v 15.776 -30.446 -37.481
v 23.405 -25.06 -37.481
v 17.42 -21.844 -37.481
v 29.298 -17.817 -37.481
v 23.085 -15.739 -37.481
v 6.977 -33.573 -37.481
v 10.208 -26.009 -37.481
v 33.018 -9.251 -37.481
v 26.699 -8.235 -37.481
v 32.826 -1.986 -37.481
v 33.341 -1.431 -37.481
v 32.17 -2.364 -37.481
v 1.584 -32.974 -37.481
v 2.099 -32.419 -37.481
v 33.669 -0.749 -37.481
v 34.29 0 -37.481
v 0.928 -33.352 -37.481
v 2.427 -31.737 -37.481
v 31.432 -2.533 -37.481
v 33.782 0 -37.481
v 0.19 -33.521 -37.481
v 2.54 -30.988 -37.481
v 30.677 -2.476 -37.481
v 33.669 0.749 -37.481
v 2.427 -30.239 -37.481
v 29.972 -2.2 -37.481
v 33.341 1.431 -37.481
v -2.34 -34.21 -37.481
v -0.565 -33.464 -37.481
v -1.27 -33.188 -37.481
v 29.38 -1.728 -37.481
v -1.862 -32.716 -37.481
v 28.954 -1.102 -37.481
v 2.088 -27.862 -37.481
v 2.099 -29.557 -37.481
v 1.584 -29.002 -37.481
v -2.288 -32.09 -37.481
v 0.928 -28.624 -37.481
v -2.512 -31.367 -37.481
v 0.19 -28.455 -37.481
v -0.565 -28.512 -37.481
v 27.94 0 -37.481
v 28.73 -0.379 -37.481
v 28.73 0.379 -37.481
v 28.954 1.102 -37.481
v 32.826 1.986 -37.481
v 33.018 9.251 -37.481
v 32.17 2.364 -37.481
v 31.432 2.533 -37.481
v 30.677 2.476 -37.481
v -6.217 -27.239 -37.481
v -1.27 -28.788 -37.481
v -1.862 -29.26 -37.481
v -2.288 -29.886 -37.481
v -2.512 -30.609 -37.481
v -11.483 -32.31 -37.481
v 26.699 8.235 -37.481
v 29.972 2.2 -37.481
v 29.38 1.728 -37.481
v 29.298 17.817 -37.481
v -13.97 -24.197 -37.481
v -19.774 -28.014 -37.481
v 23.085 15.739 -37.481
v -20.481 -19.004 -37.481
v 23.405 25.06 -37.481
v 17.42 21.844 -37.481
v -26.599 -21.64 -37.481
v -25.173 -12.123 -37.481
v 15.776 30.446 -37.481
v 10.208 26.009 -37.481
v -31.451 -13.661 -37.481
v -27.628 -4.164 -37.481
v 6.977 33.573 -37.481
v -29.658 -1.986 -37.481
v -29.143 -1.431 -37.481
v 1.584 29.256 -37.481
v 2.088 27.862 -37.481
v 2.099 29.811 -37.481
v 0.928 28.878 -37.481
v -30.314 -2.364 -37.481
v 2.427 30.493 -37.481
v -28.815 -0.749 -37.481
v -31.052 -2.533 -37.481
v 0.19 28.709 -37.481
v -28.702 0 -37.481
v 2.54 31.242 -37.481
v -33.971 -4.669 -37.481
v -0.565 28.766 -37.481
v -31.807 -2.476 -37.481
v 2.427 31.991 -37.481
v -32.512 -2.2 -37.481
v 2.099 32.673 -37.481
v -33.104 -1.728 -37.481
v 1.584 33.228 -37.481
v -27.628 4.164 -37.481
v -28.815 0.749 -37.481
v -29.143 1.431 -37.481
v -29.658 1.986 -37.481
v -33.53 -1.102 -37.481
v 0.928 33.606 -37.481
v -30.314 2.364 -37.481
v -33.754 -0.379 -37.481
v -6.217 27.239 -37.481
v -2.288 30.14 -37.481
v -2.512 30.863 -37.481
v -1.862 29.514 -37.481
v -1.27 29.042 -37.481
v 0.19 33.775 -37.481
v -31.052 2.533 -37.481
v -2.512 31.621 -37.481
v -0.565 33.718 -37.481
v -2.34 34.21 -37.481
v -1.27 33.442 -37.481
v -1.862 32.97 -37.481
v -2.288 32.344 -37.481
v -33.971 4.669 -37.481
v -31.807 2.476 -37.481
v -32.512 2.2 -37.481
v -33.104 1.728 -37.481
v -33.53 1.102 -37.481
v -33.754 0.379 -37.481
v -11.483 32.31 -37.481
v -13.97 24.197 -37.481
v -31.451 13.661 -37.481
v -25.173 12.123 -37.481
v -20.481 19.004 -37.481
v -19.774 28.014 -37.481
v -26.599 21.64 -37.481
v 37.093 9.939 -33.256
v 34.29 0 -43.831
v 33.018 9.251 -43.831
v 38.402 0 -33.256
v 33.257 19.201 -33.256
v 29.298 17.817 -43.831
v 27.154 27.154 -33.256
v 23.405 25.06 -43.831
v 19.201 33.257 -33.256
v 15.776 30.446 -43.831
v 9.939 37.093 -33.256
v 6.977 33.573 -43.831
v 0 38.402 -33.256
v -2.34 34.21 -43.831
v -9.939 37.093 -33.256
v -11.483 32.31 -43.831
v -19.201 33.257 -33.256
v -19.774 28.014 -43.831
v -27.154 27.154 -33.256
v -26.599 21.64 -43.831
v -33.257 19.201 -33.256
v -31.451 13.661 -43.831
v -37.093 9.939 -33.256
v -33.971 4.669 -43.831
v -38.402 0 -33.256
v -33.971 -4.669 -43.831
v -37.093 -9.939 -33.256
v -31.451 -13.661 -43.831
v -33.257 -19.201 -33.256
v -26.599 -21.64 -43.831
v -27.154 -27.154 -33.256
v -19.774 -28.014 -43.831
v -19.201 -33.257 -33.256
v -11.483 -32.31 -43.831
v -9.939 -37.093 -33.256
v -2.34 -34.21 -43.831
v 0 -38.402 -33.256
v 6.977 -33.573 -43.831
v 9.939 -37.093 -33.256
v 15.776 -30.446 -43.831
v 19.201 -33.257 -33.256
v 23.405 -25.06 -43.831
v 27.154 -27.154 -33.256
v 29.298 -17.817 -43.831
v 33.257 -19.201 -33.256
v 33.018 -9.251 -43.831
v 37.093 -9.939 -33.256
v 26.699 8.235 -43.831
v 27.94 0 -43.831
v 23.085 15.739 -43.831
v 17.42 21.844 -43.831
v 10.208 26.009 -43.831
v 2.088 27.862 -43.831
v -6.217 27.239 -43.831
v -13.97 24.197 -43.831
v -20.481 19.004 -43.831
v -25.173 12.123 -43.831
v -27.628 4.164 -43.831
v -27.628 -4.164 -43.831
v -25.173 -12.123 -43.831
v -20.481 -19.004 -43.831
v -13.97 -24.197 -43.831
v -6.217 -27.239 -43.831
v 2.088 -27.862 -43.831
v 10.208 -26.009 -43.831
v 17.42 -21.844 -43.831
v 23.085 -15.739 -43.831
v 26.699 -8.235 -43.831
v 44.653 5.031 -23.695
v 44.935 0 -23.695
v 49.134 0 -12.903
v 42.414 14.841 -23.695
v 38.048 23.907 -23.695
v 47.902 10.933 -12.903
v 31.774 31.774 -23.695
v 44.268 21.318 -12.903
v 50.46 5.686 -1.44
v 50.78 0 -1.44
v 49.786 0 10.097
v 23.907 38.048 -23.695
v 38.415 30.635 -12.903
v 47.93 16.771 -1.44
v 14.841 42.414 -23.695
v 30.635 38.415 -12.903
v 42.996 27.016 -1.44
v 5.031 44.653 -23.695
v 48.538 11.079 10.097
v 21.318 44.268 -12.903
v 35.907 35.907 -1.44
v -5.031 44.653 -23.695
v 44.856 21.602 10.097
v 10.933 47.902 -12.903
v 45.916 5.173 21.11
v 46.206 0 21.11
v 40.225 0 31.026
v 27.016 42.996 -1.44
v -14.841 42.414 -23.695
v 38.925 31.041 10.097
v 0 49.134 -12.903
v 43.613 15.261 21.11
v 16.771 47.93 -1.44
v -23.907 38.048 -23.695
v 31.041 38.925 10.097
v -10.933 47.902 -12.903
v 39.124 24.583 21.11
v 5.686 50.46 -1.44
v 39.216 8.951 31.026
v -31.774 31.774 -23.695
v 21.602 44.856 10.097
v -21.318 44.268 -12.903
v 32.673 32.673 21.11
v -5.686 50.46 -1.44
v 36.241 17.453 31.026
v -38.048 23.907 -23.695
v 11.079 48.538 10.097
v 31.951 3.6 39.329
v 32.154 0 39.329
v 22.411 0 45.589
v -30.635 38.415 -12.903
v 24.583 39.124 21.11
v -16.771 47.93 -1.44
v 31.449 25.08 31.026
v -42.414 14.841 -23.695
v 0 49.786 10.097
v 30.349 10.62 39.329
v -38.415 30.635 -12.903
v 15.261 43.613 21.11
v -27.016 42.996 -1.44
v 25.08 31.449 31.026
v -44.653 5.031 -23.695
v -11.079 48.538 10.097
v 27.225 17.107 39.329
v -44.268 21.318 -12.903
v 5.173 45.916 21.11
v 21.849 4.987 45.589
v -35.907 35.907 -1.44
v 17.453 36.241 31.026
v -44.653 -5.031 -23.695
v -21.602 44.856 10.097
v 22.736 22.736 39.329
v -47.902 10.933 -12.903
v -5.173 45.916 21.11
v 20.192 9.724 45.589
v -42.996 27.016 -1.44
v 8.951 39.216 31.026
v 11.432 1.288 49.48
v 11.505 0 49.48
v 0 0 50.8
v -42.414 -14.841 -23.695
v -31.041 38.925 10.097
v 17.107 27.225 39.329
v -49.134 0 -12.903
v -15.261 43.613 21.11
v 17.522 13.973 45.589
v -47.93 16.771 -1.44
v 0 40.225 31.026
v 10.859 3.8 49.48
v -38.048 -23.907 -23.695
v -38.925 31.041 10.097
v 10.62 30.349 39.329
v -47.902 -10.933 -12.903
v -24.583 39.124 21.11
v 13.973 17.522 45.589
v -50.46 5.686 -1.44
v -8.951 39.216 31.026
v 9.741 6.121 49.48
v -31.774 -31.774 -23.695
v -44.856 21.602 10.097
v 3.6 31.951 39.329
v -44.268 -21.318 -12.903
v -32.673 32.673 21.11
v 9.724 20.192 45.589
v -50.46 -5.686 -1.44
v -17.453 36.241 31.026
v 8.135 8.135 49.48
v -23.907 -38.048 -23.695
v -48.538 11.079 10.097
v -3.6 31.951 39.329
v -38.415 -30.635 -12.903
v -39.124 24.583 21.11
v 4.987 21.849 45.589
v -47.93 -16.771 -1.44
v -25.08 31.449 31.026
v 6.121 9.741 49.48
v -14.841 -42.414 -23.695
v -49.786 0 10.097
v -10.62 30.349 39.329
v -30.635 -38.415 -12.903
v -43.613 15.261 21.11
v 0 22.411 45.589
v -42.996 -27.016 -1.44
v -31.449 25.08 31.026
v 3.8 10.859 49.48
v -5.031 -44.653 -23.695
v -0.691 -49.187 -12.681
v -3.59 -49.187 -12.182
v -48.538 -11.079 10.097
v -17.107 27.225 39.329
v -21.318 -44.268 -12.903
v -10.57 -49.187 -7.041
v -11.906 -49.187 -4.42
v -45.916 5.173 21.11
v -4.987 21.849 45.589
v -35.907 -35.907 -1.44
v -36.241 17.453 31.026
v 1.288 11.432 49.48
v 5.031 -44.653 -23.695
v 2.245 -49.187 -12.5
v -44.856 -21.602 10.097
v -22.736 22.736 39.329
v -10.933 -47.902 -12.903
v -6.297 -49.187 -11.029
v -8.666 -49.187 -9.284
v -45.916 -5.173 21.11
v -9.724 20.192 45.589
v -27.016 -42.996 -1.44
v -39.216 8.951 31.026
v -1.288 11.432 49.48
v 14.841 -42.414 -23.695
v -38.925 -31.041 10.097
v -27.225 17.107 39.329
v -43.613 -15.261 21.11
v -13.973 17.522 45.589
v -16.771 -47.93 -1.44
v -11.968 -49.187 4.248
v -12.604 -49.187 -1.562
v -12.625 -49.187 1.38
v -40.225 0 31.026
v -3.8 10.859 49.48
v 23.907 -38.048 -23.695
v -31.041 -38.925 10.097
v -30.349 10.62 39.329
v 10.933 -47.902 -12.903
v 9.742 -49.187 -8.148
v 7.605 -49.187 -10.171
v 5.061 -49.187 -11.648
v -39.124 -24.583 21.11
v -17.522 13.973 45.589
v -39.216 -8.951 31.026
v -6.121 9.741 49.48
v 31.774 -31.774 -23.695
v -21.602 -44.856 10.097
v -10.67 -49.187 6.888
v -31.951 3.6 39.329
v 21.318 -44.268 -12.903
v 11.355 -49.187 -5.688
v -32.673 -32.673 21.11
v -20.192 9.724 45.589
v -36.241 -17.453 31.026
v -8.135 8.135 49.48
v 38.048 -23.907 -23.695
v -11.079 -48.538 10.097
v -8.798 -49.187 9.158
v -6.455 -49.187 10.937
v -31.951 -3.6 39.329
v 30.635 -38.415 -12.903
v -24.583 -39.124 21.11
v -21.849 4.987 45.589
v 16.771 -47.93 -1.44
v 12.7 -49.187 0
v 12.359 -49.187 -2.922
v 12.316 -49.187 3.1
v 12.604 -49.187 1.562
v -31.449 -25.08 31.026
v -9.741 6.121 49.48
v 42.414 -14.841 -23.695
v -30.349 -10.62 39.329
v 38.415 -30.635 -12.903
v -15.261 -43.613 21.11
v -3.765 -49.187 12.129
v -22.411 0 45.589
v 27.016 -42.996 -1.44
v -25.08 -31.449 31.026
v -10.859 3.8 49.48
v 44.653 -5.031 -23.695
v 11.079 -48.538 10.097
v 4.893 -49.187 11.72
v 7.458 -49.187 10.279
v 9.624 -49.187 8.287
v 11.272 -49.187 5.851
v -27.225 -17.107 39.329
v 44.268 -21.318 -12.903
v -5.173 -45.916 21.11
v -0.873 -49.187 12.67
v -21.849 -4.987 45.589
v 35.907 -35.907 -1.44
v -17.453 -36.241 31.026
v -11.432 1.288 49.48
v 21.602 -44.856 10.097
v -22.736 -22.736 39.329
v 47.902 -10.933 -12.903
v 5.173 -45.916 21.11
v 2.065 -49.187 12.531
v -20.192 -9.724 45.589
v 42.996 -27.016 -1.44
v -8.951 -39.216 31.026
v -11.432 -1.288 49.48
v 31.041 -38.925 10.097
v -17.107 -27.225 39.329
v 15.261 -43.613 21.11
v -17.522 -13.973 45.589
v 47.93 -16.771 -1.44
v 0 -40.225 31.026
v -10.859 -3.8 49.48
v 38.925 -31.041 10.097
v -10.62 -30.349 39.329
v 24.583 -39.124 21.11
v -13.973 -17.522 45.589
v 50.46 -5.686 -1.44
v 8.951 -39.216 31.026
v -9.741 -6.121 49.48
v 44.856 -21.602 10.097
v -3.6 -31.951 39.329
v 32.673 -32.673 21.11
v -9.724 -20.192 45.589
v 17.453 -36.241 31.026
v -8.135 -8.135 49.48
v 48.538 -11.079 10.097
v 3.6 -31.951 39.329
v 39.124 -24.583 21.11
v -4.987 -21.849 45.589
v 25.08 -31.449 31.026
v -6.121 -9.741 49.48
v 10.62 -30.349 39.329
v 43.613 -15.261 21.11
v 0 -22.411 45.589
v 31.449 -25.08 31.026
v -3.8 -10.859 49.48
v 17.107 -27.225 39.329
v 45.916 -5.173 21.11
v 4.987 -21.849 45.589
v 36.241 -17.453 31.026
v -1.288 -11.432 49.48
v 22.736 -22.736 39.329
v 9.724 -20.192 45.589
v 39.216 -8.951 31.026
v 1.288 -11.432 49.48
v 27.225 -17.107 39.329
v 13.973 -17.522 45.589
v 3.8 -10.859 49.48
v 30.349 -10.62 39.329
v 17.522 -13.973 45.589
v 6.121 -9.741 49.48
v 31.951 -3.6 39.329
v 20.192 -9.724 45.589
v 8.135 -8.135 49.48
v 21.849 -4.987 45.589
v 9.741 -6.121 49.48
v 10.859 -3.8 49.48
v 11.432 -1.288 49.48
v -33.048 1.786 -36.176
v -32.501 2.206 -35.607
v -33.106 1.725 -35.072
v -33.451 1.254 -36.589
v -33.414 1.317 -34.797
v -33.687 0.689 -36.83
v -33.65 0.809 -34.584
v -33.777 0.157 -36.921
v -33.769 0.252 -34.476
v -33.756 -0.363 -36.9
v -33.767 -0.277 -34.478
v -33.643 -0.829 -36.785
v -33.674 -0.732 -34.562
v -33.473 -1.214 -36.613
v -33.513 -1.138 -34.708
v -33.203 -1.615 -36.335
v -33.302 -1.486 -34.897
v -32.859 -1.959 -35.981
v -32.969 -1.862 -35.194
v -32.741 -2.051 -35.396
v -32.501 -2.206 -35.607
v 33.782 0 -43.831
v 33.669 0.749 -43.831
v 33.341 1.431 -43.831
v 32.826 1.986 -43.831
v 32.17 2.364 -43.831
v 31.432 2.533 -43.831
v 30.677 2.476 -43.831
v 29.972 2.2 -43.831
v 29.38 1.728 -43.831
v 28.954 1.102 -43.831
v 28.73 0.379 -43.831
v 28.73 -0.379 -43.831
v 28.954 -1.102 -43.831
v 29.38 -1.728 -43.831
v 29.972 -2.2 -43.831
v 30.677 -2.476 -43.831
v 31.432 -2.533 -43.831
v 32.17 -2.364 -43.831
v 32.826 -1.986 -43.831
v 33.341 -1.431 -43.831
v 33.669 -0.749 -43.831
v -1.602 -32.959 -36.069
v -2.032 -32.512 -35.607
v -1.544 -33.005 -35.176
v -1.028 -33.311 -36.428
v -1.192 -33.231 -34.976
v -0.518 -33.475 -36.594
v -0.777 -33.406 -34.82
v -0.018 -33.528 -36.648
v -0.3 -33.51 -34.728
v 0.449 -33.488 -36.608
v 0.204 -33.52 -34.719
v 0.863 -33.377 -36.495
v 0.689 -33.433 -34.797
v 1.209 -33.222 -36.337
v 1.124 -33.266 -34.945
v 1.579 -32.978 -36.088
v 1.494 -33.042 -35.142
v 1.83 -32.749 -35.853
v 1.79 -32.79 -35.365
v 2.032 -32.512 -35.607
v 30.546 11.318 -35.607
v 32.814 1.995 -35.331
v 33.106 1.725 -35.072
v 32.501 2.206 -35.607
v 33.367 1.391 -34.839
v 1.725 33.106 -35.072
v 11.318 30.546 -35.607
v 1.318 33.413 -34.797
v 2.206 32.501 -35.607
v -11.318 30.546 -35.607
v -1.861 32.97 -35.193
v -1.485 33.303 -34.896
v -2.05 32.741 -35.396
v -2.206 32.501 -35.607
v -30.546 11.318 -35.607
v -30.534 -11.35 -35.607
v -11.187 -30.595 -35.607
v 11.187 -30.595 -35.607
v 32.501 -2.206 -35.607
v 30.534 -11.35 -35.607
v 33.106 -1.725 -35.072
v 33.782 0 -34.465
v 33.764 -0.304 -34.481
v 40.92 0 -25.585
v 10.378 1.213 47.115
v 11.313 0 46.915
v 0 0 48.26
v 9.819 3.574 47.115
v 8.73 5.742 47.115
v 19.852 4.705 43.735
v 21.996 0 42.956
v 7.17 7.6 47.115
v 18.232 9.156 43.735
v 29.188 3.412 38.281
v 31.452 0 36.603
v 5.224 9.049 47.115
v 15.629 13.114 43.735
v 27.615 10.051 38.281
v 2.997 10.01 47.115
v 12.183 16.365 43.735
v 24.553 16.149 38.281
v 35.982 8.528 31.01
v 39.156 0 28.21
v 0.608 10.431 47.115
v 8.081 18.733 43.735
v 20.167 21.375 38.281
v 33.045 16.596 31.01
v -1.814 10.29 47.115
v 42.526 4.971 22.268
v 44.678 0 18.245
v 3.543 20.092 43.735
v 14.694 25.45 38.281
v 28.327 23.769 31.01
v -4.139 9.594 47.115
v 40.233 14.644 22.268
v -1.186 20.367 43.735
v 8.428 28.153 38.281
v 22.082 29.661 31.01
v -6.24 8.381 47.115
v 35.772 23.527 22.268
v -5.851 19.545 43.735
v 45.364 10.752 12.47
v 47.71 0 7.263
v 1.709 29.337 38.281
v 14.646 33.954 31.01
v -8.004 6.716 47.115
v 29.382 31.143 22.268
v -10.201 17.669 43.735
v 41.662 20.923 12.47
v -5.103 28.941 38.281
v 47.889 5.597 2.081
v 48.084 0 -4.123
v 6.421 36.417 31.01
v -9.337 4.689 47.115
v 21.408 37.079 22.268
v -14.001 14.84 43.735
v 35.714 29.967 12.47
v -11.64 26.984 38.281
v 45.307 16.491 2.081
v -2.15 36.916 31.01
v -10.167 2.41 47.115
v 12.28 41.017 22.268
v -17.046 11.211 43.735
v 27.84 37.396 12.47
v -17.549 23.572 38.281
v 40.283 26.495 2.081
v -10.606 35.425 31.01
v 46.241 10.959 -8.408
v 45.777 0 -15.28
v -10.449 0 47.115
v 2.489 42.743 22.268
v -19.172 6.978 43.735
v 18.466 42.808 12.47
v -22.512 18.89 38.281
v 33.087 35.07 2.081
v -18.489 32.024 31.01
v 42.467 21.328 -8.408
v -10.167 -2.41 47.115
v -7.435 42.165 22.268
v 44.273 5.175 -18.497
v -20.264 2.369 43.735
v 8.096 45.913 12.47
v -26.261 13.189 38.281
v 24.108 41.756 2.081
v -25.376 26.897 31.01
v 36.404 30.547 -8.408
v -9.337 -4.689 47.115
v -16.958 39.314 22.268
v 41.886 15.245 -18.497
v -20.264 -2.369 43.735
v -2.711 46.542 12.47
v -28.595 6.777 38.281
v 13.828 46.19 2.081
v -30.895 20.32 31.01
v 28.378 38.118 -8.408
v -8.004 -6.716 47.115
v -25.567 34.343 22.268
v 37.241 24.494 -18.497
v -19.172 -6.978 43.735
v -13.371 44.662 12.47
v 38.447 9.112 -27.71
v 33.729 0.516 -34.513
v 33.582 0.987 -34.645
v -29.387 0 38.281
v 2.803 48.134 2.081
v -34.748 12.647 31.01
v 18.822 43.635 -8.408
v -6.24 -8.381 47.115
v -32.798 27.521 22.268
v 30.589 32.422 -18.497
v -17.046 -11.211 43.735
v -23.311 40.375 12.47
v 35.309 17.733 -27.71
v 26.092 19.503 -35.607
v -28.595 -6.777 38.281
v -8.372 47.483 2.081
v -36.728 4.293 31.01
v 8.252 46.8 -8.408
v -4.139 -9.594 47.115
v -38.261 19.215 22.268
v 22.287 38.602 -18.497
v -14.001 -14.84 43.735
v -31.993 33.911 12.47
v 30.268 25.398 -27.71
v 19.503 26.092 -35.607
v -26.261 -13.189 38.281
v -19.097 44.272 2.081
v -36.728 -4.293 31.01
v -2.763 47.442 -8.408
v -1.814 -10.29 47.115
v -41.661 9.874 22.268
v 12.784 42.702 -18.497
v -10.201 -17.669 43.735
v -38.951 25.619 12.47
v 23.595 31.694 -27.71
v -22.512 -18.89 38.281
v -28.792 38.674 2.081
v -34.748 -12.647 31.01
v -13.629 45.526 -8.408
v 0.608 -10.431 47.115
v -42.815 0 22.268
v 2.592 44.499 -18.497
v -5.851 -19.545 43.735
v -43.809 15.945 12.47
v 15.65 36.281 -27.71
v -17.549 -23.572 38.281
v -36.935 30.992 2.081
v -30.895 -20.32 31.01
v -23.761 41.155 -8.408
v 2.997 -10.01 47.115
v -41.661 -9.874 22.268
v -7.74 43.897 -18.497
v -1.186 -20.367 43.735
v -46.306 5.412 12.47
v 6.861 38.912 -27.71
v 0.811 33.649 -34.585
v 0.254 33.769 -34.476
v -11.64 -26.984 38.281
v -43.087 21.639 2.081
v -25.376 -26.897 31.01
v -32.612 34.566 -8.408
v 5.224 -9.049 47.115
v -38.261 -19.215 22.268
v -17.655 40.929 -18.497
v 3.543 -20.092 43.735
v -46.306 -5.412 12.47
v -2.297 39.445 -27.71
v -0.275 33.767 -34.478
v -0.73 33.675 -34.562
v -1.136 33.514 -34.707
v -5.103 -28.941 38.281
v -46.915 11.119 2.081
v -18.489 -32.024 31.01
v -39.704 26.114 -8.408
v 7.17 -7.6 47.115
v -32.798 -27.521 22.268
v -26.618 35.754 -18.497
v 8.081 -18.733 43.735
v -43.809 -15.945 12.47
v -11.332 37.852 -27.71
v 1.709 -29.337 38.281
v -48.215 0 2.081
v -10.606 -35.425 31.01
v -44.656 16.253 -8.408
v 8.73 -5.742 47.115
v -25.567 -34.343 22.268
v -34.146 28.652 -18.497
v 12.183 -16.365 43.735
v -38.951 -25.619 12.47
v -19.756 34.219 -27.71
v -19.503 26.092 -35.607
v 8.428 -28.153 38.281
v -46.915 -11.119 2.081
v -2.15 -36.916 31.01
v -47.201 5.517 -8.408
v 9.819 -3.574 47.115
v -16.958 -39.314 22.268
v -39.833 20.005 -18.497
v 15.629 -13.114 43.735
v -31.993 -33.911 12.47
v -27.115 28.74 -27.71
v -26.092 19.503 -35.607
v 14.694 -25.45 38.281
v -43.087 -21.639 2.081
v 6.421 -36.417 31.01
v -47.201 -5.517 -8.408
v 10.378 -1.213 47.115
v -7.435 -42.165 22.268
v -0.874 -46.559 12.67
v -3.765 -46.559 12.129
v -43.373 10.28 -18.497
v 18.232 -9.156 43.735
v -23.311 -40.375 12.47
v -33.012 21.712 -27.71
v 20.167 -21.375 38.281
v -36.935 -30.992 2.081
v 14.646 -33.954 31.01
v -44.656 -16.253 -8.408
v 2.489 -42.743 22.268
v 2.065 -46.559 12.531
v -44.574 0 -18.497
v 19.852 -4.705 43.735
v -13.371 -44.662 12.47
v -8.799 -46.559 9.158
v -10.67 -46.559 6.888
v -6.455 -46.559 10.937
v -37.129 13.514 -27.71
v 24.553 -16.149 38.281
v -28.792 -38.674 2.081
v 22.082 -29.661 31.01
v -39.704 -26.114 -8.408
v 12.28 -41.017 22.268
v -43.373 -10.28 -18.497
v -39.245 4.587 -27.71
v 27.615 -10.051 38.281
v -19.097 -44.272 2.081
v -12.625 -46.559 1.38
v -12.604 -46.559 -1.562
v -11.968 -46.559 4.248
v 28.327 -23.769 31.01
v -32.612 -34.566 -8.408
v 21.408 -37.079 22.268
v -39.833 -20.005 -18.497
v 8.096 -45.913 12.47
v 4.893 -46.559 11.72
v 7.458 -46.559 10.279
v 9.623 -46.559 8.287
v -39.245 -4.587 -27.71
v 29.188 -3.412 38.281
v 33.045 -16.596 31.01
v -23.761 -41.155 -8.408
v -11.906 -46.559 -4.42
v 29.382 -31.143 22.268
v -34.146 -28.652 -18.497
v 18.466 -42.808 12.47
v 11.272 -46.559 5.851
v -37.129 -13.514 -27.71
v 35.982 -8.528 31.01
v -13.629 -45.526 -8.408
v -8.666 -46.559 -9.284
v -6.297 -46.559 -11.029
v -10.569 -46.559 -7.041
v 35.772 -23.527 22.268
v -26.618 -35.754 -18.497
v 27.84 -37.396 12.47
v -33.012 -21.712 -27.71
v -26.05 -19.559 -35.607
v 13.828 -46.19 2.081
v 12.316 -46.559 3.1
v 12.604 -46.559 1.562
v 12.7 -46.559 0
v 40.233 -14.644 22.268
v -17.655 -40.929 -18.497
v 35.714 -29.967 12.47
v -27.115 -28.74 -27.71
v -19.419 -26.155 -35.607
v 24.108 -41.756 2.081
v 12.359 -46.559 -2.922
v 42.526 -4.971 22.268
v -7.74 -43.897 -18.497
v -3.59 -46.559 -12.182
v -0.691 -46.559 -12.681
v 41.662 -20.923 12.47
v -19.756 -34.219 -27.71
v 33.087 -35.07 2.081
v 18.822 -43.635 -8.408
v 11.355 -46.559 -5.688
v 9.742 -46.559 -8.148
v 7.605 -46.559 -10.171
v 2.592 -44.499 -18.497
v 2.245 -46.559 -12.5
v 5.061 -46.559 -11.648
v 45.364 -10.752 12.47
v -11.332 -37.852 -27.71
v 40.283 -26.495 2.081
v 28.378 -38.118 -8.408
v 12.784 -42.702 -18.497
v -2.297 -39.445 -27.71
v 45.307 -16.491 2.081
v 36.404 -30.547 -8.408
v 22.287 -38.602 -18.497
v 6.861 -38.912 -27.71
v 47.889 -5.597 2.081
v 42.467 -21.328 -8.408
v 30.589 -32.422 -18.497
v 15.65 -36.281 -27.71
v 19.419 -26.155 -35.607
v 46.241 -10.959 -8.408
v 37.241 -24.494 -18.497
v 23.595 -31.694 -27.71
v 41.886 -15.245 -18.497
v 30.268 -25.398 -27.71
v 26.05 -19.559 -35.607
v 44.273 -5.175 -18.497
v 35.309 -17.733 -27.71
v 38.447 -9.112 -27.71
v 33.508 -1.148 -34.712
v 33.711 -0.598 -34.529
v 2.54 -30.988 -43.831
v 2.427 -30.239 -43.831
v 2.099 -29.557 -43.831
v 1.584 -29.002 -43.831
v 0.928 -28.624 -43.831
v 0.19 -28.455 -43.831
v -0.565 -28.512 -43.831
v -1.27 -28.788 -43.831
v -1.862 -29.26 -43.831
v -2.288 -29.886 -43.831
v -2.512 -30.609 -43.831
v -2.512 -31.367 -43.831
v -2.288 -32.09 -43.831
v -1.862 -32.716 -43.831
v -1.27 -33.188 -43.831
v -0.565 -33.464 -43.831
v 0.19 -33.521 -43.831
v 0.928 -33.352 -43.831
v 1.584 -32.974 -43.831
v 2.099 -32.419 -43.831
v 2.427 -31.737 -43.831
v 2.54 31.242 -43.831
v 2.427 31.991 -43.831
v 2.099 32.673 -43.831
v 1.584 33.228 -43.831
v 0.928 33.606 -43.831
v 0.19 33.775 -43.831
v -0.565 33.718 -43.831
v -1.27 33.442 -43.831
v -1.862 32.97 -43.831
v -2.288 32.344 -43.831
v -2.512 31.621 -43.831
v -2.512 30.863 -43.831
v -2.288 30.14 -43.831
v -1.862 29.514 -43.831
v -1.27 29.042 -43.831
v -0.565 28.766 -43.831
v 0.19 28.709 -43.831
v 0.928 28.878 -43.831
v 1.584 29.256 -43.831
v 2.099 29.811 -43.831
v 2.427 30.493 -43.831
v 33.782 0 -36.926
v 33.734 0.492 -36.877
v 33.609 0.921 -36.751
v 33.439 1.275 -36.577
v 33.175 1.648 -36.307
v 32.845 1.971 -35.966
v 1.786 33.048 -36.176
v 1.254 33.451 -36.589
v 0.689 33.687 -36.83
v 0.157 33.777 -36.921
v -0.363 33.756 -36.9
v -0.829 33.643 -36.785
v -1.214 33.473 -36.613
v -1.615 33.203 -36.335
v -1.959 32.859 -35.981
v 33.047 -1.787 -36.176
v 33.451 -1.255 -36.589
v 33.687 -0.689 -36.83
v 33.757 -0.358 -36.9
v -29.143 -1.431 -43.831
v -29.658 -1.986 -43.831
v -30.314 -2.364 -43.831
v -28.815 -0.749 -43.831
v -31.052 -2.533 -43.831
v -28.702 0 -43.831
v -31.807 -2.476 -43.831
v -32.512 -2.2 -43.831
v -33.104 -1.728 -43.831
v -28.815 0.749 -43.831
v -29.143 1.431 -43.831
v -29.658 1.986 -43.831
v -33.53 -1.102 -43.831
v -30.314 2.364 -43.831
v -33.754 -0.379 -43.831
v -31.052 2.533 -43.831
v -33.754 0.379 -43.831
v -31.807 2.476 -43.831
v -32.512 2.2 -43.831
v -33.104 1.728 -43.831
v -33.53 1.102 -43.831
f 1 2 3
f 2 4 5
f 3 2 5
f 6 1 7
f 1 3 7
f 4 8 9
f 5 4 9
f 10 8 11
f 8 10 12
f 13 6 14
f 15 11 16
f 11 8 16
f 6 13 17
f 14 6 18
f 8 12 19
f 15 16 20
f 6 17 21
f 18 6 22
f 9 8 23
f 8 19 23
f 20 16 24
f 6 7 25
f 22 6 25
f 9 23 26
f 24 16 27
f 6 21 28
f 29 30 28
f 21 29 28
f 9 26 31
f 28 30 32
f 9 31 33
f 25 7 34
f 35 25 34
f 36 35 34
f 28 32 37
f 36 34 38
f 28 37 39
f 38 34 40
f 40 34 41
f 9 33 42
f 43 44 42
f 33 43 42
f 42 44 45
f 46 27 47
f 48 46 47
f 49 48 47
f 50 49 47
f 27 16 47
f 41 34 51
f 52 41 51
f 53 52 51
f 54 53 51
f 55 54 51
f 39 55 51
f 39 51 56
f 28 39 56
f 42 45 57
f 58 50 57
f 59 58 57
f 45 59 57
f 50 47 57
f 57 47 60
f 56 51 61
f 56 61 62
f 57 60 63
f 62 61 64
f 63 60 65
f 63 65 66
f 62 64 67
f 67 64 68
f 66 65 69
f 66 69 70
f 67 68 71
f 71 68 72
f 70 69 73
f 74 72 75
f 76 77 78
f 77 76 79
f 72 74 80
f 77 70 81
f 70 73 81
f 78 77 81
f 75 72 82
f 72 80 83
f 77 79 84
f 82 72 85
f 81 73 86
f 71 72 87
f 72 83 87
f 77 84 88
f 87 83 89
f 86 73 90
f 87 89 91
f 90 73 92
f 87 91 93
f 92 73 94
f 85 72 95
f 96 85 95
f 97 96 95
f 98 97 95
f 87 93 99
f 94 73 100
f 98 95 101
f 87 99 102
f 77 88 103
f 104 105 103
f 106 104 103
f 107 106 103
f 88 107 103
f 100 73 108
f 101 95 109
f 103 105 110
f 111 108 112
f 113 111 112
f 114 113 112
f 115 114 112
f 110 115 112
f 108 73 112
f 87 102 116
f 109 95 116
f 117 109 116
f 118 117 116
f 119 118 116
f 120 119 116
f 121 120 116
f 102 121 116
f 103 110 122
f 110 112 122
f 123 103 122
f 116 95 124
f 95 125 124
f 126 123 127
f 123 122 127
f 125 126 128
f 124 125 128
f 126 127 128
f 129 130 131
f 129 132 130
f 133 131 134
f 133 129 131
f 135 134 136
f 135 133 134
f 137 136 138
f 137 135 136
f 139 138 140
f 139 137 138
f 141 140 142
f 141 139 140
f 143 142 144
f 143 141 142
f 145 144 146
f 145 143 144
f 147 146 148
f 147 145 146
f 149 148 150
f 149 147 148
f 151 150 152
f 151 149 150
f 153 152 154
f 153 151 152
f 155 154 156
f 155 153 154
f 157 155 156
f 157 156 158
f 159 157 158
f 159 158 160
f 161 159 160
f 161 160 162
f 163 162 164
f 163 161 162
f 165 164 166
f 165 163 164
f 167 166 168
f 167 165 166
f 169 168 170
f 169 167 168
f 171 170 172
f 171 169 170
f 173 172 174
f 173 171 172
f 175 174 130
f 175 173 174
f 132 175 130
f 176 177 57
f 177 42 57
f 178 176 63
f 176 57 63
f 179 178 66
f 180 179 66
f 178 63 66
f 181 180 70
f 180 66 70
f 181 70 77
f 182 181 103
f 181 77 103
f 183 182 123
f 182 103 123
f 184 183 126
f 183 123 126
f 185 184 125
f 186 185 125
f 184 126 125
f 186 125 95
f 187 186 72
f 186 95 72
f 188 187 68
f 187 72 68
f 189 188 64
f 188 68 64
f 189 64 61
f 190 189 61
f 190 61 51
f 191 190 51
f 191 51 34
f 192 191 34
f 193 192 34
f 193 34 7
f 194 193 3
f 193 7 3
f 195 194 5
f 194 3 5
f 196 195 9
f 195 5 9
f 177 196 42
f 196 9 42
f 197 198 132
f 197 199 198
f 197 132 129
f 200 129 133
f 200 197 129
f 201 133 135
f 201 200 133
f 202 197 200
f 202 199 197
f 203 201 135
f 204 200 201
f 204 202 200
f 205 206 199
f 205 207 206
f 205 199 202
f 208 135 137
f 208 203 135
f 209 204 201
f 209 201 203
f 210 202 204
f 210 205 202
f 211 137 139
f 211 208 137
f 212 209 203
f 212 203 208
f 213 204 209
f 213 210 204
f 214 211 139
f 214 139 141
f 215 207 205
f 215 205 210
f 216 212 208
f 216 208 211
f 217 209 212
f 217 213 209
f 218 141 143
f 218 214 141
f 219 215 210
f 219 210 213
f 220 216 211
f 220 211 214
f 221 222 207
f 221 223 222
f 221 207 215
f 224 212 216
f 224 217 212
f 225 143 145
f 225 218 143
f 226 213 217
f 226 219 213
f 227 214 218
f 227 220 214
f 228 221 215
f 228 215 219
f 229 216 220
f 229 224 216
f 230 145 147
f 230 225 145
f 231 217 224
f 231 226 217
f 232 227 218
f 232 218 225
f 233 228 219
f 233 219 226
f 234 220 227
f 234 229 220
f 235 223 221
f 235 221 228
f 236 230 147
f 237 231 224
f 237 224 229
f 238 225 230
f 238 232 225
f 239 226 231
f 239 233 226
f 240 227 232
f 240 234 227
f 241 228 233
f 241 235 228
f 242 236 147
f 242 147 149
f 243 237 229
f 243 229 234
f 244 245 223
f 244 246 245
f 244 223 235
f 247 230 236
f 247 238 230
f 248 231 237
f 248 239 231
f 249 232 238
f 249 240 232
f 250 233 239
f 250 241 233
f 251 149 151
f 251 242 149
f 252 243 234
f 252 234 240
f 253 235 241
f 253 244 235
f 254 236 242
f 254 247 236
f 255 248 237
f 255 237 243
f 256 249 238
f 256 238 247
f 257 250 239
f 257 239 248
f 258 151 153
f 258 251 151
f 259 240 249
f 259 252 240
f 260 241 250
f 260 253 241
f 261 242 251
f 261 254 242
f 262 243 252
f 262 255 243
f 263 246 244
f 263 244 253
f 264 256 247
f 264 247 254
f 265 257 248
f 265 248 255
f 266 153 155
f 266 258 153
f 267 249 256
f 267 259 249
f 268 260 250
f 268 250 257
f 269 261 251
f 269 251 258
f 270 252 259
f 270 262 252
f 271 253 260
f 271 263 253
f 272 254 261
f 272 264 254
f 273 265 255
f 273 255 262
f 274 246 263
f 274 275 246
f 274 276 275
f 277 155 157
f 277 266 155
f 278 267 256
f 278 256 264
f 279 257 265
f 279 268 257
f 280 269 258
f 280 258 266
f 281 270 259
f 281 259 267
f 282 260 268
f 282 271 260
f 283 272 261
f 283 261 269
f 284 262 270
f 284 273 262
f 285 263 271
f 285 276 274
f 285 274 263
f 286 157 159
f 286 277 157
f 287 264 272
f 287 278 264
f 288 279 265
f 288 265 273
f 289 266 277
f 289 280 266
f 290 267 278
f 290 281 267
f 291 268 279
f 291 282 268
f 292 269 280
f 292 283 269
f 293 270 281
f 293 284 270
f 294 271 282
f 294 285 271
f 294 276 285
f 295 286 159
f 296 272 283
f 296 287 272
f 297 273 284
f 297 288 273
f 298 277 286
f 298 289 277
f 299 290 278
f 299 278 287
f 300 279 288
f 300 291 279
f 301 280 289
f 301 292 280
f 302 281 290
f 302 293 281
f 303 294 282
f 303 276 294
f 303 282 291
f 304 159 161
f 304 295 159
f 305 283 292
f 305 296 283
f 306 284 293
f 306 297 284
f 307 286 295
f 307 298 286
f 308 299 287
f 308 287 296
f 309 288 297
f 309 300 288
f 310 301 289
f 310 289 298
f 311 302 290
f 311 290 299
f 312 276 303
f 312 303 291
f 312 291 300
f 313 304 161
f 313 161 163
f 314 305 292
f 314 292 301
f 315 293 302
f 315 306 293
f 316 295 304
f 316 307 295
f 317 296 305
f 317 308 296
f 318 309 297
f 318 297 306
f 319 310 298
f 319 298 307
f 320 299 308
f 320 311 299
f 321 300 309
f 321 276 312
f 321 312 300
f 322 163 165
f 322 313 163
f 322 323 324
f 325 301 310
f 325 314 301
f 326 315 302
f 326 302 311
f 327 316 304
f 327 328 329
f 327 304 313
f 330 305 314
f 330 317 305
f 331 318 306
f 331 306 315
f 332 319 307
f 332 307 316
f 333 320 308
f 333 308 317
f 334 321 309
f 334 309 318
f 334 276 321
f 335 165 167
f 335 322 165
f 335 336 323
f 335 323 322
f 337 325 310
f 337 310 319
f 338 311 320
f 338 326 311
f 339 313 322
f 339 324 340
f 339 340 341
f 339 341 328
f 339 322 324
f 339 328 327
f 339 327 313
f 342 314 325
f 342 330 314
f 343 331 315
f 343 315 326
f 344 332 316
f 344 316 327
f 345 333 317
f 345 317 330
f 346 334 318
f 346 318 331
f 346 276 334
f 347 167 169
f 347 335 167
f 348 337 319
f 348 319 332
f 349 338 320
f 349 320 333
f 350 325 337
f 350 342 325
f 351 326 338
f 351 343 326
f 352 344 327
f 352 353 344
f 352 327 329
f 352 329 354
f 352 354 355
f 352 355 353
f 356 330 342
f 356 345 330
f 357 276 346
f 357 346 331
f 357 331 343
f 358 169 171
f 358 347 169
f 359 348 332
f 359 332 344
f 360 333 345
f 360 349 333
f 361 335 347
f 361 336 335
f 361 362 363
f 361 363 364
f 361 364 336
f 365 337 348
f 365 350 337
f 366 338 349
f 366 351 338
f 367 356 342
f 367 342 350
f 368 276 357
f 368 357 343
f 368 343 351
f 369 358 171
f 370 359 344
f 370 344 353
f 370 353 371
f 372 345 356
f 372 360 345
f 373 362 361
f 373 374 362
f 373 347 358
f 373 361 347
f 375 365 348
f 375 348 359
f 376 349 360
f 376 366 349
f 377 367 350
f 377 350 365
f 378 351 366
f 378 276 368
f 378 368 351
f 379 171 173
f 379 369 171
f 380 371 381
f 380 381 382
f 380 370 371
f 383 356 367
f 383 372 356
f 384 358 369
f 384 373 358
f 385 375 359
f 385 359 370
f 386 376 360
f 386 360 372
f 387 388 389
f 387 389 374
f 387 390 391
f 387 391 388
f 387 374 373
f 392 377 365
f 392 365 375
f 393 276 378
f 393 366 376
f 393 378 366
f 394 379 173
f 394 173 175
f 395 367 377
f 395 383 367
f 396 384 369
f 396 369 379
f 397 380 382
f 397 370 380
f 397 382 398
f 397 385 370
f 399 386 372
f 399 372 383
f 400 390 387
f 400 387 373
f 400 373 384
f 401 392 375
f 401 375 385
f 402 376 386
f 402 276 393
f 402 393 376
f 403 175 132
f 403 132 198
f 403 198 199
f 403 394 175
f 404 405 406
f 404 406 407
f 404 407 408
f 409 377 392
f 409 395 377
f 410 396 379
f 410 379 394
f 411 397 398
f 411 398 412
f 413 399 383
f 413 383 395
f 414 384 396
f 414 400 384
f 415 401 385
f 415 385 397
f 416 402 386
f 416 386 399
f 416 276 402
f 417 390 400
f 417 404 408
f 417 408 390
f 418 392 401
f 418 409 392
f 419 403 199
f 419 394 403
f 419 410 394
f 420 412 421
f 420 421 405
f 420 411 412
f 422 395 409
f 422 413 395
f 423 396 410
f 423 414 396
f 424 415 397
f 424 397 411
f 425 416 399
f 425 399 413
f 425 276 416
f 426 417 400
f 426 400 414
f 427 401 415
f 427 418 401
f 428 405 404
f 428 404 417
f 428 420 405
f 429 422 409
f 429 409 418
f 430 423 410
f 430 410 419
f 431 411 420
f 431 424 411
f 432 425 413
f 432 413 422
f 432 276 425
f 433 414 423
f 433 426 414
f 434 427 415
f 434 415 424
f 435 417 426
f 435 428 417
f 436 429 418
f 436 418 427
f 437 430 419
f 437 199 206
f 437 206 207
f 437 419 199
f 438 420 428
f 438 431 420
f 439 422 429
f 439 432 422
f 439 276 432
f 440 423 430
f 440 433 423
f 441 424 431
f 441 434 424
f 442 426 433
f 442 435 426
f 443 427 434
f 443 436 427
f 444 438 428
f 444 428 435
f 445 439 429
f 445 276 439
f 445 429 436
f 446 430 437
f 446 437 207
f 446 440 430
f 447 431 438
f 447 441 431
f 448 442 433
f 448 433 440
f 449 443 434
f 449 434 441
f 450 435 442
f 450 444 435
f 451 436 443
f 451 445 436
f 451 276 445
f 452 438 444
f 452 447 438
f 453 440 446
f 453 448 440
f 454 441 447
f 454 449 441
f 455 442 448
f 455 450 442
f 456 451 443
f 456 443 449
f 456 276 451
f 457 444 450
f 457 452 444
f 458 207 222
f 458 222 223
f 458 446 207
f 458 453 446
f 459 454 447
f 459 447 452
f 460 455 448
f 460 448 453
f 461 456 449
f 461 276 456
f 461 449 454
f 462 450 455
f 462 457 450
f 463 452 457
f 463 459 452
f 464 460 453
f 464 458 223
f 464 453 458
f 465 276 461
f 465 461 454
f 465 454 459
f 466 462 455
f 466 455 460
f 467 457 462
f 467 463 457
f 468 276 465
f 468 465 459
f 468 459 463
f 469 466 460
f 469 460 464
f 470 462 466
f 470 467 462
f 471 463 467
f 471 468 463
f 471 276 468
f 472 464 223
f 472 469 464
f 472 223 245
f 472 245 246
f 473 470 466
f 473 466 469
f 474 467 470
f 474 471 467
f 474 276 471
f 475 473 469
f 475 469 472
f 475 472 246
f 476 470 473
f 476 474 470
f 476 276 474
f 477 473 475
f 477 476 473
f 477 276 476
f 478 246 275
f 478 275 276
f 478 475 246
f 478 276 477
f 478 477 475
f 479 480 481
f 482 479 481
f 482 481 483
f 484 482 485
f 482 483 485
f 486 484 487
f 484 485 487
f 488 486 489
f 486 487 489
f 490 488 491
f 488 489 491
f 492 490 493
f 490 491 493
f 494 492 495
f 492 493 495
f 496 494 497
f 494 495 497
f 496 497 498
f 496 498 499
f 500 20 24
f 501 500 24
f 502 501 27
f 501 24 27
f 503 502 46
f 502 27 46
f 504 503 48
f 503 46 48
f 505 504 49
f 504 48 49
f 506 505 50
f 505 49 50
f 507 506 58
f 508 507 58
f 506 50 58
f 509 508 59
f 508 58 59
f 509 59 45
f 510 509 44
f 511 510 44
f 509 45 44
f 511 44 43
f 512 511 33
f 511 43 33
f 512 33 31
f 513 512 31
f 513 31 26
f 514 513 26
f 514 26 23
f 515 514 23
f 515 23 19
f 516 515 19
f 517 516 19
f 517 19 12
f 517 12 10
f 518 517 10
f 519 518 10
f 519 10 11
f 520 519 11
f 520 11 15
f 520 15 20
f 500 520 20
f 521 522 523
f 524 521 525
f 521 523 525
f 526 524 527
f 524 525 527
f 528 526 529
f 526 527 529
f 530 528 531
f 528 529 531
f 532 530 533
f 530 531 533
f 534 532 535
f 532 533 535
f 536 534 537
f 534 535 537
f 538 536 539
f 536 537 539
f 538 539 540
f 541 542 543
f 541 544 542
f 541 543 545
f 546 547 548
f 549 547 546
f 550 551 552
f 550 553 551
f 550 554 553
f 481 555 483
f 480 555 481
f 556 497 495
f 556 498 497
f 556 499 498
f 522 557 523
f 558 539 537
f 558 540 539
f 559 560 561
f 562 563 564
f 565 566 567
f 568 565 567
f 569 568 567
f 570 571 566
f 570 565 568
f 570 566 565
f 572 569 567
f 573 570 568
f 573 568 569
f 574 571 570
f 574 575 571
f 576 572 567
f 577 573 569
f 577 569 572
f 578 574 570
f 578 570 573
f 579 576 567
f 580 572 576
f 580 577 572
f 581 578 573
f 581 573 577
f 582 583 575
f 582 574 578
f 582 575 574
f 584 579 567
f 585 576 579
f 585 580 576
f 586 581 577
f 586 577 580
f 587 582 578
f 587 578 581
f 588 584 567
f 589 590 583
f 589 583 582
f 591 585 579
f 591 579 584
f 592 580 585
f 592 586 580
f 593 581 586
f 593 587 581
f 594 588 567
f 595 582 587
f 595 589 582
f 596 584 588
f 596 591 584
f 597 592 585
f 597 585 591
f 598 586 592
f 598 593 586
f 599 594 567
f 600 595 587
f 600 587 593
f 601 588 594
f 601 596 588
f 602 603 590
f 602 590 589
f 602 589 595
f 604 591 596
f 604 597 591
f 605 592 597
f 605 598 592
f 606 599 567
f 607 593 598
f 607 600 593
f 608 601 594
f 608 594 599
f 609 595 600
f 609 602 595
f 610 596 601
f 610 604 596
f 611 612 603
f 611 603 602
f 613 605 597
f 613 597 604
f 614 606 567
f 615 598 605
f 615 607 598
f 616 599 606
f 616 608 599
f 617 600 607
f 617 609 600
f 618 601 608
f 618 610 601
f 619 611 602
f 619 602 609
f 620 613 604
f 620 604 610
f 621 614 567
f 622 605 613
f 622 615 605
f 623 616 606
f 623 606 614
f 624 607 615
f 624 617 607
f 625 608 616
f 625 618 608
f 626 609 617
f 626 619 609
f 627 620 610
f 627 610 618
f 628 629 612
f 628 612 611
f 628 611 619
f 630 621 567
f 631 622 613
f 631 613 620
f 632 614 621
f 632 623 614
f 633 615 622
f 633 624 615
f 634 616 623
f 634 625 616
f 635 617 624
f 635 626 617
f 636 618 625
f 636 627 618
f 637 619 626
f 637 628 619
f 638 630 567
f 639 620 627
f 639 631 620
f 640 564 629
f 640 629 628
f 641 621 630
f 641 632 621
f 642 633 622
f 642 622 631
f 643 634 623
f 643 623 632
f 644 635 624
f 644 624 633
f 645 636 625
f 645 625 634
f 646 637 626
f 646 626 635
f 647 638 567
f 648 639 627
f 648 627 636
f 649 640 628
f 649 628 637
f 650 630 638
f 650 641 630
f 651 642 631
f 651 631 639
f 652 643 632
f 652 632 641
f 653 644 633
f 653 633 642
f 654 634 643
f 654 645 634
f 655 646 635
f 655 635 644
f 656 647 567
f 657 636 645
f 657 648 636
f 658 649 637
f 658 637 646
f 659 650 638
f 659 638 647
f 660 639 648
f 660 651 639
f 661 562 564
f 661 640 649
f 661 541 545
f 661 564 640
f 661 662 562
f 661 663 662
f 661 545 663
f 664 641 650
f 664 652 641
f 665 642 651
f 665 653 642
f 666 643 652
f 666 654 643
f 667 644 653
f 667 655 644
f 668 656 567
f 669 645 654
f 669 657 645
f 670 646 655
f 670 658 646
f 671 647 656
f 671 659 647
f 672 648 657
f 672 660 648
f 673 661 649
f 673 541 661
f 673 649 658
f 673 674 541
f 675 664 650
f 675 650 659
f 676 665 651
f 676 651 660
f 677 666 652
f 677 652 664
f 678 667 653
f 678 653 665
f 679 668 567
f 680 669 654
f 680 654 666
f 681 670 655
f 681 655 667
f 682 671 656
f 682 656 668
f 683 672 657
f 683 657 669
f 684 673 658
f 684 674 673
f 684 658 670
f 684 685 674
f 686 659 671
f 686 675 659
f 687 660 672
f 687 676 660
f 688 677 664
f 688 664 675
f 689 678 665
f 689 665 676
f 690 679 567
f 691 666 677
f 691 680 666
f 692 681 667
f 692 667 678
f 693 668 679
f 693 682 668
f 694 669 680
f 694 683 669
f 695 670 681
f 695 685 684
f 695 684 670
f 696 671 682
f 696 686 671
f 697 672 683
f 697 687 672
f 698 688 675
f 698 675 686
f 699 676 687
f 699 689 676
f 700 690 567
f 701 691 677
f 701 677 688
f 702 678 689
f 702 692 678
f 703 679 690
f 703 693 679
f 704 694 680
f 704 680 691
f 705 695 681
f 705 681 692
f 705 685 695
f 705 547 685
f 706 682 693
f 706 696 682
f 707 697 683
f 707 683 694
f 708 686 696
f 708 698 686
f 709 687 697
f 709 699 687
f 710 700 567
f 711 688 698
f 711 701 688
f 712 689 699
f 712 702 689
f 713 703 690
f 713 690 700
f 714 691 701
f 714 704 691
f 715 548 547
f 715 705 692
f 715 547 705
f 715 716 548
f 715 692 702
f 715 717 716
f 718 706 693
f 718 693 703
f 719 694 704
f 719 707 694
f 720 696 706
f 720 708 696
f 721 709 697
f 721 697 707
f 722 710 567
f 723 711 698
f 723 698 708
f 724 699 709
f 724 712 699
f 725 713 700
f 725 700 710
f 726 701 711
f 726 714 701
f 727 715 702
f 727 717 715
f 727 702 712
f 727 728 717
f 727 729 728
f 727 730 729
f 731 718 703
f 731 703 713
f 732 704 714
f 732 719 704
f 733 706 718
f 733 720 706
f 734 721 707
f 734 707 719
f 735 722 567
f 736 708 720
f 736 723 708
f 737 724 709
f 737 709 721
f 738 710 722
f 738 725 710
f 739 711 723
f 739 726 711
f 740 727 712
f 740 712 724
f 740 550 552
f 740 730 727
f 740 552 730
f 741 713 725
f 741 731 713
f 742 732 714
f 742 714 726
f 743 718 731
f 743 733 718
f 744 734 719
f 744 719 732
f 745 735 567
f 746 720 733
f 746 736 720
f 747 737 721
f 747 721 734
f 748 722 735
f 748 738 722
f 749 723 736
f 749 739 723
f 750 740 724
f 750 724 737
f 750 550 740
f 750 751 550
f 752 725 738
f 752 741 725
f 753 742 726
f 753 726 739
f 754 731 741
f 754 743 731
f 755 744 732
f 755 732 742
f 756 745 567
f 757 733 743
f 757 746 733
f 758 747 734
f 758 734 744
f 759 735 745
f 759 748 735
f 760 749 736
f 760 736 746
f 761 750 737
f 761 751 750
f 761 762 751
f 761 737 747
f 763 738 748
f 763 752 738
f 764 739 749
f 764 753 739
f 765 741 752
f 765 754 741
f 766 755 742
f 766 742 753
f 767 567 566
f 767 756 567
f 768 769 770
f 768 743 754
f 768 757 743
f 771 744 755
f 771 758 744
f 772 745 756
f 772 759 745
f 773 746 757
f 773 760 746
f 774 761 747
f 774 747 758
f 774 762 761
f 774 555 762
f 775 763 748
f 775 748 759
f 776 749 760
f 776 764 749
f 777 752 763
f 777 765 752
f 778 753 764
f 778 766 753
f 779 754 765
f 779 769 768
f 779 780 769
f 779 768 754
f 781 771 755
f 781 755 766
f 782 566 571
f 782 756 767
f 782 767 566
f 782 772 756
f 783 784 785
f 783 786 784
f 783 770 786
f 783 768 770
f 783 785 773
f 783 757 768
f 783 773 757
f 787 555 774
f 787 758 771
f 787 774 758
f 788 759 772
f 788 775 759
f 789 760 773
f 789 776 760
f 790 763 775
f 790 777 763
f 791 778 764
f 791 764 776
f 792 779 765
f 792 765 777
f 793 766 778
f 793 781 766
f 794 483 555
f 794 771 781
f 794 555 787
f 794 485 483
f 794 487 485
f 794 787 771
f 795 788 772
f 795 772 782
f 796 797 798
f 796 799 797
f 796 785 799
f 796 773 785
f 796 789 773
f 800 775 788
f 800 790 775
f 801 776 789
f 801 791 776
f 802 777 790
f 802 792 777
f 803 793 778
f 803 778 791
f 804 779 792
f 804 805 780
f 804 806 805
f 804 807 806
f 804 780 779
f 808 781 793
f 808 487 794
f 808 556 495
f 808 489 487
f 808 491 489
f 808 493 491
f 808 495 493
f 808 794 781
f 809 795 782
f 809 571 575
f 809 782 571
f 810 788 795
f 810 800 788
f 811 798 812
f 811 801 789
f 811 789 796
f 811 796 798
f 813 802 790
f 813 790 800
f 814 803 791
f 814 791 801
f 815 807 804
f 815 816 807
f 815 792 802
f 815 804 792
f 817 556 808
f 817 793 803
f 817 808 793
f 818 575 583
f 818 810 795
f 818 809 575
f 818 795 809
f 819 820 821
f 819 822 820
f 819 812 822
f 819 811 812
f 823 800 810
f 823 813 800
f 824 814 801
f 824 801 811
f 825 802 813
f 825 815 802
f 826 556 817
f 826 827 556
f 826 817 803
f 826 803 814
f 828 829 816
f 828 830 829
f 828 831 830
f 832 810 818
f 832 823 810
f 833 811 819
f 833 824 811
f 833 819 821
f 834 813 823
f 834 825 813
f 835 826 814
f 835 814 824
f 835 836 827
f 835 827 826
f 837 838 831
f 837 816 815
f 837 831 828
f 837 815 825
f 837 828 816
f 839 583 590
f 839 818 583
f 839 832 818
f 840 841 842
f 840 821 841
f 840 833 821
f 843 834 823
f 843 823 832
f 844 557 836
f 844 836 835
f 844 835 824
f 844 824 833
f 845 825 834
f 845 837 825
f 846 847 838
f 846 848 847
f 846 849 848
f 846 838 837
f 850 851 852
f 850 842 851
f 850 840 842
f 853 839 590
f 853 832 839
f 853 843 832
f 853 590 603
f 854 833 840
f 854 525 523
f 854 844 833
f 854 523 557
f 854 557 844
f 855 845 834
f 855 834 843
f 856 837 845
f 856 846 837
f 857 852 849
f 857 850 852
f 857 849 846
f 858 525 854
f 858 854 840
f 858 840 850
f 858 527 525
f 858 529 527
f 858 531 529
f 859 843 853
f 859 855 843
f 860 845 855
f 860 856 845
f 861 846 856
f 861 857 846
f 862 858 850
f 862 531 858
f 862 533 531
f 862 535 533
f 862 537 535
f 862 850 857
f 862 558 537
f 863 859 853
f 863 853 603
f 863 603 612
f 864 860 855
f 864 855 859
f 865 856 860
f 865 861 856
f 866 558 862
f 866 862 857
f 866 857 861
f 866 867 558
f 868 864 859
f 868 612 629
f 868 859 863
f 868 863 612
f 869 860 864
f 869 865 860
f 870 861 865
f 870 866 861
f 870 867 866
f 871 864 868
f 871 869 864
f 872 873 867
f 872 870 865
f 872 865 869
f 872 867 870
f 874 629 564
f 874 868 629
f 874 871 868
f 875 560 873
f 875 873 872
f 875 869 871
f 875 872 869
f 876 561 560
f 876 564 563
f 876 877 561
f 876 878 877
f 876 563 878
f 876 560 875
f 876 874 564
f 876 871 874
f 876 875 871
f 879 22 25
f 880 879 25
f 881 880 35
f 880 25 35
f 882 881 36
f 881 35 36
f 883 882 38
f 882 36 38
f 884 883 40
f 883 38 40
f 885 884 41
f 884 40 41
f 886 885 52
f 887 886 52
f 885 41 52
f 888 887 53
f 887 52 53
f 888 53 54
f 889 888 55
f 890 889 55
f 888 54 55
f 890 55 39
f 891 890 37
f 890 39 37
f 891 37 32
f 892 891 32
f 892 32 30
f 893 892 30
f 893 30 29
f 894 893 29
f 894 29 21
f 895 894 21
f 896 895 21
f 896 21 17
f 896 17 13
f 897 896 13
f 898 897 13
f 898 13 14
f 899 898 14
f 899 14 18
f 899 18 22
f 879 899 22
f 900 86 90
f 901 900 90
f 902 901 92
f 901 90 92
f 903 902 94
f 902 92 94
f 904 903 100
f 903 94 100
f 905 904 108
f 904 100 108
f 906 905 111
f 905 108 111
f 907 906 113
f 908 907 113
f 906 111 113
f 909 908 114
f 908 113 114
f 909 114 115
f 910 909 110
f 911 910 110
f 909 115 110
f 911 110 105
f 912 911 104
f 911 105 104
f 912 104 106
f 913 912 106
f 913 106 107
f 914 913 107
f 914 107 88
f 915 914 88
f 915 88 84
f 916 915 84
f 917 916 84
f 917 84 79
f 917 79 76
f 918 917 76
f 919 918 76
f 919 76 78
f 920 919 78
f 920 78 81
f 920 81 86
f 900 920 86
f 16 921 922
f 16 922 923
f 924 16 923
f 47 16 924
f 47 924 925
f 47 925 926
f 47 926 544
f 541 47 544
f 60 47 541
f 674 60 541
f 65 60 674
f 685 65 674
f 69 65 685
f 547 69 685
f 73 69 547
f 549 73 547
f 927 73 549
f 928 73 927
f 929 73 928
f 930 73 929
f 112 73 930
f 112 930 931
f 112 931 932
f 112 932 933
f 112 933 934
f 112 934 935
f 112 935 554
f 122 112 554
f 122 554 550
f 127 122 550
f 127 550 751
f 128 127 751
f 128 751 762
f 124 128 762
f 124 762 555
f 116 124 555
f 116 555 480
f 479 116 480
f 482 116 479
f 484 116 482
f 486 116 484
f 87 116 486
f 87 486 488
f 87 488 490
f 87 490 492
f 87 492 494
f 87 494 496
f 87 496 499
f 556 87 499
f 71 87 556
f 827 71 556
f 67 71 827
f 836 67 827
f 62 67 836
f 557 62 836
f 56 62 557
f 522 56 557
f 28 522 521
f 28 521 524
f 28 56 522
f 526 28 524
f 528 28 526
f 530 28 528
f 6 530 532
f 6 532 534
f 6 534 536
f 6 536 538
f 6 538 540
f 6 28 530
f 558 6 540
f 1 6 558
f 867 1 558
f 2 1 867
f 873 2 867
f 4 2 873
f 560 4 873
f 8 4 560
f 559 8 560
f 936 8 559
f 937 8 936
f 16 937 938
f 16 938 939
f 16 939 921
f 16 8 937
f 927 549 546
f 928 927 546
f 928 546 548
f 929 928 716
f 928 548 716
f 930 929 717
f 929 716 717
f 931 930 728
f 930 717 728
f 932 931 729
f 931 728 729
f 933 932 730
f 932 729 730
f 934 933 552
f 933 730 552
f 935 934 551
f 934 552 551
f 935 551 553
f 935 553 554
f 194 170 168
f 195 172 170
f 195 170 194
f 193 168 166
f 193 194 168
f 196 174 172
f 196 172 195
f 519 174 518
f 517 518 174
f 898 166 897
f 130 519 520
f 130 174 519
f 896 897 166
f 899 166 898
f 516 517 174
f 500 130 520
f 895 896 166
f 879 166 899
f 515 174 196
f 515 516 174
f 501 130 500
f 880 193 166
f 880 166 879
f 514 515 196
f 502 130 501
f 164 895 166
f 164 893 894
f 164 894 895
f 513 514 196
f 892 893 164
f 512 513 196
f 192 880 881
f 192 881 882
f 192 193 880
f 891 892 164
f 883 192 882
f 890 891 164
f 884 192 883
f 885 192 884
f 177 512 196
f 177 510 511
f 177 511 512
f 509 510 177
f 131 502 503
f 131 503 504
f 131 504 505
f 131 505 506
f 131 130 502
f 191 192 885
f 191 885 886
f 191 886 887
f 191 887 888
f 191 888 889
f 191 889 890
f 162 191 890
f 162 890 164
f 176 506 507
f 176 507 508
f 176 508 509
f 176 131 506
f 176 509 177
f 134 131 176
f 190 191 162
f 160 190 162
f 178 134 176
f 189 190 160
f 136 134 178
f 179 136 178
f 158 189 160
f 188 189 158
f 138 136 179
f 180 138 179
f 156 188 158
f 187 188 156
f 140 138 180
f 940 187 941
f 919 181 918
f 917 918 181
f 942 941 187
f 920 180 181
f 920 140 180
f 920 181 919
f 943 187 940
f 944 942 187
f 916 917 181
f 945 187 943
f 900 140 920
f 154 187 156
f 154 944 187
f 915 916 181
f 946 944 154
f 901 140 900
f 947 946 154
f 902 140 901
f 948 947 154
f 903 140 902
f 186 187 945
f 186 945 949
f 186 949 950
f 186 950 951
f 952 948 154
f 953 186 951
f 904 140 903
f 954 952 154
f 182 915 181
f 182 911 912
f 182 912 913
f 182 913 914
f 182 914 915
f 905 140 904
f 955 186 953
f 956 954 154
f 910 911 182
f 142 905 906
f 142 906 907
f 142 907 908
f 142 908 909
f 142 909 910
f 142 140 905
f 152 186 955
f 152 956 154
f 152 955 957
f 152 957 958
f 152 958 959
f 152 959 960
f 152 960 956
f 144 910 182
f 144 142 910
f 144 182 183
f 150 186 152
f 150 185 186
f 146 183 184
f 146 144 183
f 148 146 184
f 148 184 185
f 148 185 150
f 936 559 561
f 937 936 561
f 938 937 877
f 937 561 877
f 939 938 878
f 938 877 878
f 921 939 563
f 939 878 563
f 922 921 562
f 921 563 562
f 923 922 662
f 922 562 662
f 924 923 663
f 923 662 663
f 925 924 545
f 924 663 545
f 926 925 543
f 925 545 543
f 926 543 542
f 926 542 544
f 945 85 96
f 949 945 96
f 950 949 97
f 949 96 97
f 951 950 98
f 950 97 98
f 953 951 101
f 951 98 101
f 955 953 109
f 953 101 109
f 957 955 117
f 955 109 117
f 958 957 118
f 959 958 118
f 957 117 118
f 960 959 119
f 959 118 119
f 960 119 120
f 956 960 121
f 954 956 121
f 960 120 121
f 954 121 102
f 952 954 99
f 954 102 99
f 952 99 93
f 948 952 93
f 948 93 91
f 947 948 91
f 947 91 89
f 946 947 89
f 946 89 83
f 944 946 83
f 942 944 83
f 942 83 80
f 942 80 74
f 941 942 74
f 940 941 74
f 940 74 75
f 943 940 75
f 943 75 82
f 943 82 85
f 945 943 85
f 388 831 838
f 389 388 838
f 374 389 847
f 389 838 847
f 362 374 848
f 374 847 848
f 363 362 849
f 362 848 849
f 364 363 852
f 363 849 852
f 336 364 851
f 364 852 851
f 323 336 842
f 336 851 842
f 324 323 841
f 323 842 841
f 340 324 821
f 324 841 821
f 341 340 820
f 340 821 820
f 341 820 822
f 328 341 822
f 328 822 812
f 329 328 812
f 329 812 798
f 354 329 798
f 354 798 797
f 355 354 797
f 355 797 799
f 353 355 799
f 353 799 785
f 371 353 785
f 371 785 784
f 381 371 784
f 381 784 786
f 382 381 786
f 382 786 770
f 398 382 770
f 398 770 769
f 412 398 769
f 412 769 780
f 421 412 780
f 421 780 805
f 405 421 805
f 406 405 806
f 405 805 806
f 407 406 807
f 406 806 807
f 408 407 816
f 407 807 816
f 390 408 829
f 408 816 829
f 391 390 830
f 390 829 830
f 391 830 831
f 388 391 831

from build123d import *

# Parameters (mm, degrees)
F0_W     = 6.35
F0_H     = 6.35
F2_D     = 25.4
F2_DEPTH = 50.801
F4_D     = 5.08
F4_DEPTH = 43.832140591
F6_D     = 5.08
F6_DEPTH = 43.832140591
F7_D     = 5.08
F7_DEPTH = 43.832140591


with BuildPart() as f1:
    # F0 (on Front) → F1 (revolve)
    with BuildSketch(Plane.XZ):
        with BuildLine():
            ThreePointArc((38.401894824, -33.2555931225), (46.2061907682, 21.1099013425), (0, 50.8))
            Line((0, 50.8), (0, 48.26))
            ThreePointArc((0, 48.26), (44.9856946855, 17.4732616779), (32.5755, -35.6070835614))
            Line((32.5755, -35.6070835614), (34.29, -37.481140591))
            ThreePointArc((34.29, -37.481140591), (36.407302923, -35.4280721162), (38.401894824, -33.2555931225))
        make_face()
        with Locations((31.115, -40.656140591)):
            Rectangle(F0_W, F0_H)
        with BuildLine():
            Line((34.29, -43.831140591), (38.401894824, -33.2555931225))
            ThreePointArc((38.401894824, -33.2555931225), (36.407302923, -35.4280721162), (34.29, -37.481140591))
            Line((34.29, -37.481140591), (34.29, -43.831140591))
        make_face()
    revolve(axis=Axis((0, 0, 49.53), (0, 0, 1)))

    # F2 (through all, one way)
    with BuildSketch(Plane(origin=(0, 0, 0), x_dir=(1, 0, 0), z_dir=(0, 1, 0))):
        with Locations((0, 0)):
            Circle(F2_D / 2)
    extrude(amount=-F2_DEPTH, mode=Mode.SUBTRACT)

    # F4 (through all, one way)
    with BuildSketch(Plane.XY):
        with Locations((-31.242, 0)):
            Circle(F4_D / 2)
    extrude(amount=-F4_DEPTH, mode=Mode.SUBTRACT)

    # F6 (through all, one way)
    with BuildSketch(Plane.XY):
        with Locations((0, -30.988)):
            Circle(F6_D / 2)
    extrude(amount=-F6_DEPTH, mode=Mode.SUBTRACT)

    # F7 (through all, one way)
    with BuildSketch(Plane.XY):
        with Locations((0, 31.242), (31.242, 0)):
            Circle(F7_D / 2)
    extrude(amount=-F7_DEPTH, mode=Mode.SUBTRACT)


solid = f1.part
